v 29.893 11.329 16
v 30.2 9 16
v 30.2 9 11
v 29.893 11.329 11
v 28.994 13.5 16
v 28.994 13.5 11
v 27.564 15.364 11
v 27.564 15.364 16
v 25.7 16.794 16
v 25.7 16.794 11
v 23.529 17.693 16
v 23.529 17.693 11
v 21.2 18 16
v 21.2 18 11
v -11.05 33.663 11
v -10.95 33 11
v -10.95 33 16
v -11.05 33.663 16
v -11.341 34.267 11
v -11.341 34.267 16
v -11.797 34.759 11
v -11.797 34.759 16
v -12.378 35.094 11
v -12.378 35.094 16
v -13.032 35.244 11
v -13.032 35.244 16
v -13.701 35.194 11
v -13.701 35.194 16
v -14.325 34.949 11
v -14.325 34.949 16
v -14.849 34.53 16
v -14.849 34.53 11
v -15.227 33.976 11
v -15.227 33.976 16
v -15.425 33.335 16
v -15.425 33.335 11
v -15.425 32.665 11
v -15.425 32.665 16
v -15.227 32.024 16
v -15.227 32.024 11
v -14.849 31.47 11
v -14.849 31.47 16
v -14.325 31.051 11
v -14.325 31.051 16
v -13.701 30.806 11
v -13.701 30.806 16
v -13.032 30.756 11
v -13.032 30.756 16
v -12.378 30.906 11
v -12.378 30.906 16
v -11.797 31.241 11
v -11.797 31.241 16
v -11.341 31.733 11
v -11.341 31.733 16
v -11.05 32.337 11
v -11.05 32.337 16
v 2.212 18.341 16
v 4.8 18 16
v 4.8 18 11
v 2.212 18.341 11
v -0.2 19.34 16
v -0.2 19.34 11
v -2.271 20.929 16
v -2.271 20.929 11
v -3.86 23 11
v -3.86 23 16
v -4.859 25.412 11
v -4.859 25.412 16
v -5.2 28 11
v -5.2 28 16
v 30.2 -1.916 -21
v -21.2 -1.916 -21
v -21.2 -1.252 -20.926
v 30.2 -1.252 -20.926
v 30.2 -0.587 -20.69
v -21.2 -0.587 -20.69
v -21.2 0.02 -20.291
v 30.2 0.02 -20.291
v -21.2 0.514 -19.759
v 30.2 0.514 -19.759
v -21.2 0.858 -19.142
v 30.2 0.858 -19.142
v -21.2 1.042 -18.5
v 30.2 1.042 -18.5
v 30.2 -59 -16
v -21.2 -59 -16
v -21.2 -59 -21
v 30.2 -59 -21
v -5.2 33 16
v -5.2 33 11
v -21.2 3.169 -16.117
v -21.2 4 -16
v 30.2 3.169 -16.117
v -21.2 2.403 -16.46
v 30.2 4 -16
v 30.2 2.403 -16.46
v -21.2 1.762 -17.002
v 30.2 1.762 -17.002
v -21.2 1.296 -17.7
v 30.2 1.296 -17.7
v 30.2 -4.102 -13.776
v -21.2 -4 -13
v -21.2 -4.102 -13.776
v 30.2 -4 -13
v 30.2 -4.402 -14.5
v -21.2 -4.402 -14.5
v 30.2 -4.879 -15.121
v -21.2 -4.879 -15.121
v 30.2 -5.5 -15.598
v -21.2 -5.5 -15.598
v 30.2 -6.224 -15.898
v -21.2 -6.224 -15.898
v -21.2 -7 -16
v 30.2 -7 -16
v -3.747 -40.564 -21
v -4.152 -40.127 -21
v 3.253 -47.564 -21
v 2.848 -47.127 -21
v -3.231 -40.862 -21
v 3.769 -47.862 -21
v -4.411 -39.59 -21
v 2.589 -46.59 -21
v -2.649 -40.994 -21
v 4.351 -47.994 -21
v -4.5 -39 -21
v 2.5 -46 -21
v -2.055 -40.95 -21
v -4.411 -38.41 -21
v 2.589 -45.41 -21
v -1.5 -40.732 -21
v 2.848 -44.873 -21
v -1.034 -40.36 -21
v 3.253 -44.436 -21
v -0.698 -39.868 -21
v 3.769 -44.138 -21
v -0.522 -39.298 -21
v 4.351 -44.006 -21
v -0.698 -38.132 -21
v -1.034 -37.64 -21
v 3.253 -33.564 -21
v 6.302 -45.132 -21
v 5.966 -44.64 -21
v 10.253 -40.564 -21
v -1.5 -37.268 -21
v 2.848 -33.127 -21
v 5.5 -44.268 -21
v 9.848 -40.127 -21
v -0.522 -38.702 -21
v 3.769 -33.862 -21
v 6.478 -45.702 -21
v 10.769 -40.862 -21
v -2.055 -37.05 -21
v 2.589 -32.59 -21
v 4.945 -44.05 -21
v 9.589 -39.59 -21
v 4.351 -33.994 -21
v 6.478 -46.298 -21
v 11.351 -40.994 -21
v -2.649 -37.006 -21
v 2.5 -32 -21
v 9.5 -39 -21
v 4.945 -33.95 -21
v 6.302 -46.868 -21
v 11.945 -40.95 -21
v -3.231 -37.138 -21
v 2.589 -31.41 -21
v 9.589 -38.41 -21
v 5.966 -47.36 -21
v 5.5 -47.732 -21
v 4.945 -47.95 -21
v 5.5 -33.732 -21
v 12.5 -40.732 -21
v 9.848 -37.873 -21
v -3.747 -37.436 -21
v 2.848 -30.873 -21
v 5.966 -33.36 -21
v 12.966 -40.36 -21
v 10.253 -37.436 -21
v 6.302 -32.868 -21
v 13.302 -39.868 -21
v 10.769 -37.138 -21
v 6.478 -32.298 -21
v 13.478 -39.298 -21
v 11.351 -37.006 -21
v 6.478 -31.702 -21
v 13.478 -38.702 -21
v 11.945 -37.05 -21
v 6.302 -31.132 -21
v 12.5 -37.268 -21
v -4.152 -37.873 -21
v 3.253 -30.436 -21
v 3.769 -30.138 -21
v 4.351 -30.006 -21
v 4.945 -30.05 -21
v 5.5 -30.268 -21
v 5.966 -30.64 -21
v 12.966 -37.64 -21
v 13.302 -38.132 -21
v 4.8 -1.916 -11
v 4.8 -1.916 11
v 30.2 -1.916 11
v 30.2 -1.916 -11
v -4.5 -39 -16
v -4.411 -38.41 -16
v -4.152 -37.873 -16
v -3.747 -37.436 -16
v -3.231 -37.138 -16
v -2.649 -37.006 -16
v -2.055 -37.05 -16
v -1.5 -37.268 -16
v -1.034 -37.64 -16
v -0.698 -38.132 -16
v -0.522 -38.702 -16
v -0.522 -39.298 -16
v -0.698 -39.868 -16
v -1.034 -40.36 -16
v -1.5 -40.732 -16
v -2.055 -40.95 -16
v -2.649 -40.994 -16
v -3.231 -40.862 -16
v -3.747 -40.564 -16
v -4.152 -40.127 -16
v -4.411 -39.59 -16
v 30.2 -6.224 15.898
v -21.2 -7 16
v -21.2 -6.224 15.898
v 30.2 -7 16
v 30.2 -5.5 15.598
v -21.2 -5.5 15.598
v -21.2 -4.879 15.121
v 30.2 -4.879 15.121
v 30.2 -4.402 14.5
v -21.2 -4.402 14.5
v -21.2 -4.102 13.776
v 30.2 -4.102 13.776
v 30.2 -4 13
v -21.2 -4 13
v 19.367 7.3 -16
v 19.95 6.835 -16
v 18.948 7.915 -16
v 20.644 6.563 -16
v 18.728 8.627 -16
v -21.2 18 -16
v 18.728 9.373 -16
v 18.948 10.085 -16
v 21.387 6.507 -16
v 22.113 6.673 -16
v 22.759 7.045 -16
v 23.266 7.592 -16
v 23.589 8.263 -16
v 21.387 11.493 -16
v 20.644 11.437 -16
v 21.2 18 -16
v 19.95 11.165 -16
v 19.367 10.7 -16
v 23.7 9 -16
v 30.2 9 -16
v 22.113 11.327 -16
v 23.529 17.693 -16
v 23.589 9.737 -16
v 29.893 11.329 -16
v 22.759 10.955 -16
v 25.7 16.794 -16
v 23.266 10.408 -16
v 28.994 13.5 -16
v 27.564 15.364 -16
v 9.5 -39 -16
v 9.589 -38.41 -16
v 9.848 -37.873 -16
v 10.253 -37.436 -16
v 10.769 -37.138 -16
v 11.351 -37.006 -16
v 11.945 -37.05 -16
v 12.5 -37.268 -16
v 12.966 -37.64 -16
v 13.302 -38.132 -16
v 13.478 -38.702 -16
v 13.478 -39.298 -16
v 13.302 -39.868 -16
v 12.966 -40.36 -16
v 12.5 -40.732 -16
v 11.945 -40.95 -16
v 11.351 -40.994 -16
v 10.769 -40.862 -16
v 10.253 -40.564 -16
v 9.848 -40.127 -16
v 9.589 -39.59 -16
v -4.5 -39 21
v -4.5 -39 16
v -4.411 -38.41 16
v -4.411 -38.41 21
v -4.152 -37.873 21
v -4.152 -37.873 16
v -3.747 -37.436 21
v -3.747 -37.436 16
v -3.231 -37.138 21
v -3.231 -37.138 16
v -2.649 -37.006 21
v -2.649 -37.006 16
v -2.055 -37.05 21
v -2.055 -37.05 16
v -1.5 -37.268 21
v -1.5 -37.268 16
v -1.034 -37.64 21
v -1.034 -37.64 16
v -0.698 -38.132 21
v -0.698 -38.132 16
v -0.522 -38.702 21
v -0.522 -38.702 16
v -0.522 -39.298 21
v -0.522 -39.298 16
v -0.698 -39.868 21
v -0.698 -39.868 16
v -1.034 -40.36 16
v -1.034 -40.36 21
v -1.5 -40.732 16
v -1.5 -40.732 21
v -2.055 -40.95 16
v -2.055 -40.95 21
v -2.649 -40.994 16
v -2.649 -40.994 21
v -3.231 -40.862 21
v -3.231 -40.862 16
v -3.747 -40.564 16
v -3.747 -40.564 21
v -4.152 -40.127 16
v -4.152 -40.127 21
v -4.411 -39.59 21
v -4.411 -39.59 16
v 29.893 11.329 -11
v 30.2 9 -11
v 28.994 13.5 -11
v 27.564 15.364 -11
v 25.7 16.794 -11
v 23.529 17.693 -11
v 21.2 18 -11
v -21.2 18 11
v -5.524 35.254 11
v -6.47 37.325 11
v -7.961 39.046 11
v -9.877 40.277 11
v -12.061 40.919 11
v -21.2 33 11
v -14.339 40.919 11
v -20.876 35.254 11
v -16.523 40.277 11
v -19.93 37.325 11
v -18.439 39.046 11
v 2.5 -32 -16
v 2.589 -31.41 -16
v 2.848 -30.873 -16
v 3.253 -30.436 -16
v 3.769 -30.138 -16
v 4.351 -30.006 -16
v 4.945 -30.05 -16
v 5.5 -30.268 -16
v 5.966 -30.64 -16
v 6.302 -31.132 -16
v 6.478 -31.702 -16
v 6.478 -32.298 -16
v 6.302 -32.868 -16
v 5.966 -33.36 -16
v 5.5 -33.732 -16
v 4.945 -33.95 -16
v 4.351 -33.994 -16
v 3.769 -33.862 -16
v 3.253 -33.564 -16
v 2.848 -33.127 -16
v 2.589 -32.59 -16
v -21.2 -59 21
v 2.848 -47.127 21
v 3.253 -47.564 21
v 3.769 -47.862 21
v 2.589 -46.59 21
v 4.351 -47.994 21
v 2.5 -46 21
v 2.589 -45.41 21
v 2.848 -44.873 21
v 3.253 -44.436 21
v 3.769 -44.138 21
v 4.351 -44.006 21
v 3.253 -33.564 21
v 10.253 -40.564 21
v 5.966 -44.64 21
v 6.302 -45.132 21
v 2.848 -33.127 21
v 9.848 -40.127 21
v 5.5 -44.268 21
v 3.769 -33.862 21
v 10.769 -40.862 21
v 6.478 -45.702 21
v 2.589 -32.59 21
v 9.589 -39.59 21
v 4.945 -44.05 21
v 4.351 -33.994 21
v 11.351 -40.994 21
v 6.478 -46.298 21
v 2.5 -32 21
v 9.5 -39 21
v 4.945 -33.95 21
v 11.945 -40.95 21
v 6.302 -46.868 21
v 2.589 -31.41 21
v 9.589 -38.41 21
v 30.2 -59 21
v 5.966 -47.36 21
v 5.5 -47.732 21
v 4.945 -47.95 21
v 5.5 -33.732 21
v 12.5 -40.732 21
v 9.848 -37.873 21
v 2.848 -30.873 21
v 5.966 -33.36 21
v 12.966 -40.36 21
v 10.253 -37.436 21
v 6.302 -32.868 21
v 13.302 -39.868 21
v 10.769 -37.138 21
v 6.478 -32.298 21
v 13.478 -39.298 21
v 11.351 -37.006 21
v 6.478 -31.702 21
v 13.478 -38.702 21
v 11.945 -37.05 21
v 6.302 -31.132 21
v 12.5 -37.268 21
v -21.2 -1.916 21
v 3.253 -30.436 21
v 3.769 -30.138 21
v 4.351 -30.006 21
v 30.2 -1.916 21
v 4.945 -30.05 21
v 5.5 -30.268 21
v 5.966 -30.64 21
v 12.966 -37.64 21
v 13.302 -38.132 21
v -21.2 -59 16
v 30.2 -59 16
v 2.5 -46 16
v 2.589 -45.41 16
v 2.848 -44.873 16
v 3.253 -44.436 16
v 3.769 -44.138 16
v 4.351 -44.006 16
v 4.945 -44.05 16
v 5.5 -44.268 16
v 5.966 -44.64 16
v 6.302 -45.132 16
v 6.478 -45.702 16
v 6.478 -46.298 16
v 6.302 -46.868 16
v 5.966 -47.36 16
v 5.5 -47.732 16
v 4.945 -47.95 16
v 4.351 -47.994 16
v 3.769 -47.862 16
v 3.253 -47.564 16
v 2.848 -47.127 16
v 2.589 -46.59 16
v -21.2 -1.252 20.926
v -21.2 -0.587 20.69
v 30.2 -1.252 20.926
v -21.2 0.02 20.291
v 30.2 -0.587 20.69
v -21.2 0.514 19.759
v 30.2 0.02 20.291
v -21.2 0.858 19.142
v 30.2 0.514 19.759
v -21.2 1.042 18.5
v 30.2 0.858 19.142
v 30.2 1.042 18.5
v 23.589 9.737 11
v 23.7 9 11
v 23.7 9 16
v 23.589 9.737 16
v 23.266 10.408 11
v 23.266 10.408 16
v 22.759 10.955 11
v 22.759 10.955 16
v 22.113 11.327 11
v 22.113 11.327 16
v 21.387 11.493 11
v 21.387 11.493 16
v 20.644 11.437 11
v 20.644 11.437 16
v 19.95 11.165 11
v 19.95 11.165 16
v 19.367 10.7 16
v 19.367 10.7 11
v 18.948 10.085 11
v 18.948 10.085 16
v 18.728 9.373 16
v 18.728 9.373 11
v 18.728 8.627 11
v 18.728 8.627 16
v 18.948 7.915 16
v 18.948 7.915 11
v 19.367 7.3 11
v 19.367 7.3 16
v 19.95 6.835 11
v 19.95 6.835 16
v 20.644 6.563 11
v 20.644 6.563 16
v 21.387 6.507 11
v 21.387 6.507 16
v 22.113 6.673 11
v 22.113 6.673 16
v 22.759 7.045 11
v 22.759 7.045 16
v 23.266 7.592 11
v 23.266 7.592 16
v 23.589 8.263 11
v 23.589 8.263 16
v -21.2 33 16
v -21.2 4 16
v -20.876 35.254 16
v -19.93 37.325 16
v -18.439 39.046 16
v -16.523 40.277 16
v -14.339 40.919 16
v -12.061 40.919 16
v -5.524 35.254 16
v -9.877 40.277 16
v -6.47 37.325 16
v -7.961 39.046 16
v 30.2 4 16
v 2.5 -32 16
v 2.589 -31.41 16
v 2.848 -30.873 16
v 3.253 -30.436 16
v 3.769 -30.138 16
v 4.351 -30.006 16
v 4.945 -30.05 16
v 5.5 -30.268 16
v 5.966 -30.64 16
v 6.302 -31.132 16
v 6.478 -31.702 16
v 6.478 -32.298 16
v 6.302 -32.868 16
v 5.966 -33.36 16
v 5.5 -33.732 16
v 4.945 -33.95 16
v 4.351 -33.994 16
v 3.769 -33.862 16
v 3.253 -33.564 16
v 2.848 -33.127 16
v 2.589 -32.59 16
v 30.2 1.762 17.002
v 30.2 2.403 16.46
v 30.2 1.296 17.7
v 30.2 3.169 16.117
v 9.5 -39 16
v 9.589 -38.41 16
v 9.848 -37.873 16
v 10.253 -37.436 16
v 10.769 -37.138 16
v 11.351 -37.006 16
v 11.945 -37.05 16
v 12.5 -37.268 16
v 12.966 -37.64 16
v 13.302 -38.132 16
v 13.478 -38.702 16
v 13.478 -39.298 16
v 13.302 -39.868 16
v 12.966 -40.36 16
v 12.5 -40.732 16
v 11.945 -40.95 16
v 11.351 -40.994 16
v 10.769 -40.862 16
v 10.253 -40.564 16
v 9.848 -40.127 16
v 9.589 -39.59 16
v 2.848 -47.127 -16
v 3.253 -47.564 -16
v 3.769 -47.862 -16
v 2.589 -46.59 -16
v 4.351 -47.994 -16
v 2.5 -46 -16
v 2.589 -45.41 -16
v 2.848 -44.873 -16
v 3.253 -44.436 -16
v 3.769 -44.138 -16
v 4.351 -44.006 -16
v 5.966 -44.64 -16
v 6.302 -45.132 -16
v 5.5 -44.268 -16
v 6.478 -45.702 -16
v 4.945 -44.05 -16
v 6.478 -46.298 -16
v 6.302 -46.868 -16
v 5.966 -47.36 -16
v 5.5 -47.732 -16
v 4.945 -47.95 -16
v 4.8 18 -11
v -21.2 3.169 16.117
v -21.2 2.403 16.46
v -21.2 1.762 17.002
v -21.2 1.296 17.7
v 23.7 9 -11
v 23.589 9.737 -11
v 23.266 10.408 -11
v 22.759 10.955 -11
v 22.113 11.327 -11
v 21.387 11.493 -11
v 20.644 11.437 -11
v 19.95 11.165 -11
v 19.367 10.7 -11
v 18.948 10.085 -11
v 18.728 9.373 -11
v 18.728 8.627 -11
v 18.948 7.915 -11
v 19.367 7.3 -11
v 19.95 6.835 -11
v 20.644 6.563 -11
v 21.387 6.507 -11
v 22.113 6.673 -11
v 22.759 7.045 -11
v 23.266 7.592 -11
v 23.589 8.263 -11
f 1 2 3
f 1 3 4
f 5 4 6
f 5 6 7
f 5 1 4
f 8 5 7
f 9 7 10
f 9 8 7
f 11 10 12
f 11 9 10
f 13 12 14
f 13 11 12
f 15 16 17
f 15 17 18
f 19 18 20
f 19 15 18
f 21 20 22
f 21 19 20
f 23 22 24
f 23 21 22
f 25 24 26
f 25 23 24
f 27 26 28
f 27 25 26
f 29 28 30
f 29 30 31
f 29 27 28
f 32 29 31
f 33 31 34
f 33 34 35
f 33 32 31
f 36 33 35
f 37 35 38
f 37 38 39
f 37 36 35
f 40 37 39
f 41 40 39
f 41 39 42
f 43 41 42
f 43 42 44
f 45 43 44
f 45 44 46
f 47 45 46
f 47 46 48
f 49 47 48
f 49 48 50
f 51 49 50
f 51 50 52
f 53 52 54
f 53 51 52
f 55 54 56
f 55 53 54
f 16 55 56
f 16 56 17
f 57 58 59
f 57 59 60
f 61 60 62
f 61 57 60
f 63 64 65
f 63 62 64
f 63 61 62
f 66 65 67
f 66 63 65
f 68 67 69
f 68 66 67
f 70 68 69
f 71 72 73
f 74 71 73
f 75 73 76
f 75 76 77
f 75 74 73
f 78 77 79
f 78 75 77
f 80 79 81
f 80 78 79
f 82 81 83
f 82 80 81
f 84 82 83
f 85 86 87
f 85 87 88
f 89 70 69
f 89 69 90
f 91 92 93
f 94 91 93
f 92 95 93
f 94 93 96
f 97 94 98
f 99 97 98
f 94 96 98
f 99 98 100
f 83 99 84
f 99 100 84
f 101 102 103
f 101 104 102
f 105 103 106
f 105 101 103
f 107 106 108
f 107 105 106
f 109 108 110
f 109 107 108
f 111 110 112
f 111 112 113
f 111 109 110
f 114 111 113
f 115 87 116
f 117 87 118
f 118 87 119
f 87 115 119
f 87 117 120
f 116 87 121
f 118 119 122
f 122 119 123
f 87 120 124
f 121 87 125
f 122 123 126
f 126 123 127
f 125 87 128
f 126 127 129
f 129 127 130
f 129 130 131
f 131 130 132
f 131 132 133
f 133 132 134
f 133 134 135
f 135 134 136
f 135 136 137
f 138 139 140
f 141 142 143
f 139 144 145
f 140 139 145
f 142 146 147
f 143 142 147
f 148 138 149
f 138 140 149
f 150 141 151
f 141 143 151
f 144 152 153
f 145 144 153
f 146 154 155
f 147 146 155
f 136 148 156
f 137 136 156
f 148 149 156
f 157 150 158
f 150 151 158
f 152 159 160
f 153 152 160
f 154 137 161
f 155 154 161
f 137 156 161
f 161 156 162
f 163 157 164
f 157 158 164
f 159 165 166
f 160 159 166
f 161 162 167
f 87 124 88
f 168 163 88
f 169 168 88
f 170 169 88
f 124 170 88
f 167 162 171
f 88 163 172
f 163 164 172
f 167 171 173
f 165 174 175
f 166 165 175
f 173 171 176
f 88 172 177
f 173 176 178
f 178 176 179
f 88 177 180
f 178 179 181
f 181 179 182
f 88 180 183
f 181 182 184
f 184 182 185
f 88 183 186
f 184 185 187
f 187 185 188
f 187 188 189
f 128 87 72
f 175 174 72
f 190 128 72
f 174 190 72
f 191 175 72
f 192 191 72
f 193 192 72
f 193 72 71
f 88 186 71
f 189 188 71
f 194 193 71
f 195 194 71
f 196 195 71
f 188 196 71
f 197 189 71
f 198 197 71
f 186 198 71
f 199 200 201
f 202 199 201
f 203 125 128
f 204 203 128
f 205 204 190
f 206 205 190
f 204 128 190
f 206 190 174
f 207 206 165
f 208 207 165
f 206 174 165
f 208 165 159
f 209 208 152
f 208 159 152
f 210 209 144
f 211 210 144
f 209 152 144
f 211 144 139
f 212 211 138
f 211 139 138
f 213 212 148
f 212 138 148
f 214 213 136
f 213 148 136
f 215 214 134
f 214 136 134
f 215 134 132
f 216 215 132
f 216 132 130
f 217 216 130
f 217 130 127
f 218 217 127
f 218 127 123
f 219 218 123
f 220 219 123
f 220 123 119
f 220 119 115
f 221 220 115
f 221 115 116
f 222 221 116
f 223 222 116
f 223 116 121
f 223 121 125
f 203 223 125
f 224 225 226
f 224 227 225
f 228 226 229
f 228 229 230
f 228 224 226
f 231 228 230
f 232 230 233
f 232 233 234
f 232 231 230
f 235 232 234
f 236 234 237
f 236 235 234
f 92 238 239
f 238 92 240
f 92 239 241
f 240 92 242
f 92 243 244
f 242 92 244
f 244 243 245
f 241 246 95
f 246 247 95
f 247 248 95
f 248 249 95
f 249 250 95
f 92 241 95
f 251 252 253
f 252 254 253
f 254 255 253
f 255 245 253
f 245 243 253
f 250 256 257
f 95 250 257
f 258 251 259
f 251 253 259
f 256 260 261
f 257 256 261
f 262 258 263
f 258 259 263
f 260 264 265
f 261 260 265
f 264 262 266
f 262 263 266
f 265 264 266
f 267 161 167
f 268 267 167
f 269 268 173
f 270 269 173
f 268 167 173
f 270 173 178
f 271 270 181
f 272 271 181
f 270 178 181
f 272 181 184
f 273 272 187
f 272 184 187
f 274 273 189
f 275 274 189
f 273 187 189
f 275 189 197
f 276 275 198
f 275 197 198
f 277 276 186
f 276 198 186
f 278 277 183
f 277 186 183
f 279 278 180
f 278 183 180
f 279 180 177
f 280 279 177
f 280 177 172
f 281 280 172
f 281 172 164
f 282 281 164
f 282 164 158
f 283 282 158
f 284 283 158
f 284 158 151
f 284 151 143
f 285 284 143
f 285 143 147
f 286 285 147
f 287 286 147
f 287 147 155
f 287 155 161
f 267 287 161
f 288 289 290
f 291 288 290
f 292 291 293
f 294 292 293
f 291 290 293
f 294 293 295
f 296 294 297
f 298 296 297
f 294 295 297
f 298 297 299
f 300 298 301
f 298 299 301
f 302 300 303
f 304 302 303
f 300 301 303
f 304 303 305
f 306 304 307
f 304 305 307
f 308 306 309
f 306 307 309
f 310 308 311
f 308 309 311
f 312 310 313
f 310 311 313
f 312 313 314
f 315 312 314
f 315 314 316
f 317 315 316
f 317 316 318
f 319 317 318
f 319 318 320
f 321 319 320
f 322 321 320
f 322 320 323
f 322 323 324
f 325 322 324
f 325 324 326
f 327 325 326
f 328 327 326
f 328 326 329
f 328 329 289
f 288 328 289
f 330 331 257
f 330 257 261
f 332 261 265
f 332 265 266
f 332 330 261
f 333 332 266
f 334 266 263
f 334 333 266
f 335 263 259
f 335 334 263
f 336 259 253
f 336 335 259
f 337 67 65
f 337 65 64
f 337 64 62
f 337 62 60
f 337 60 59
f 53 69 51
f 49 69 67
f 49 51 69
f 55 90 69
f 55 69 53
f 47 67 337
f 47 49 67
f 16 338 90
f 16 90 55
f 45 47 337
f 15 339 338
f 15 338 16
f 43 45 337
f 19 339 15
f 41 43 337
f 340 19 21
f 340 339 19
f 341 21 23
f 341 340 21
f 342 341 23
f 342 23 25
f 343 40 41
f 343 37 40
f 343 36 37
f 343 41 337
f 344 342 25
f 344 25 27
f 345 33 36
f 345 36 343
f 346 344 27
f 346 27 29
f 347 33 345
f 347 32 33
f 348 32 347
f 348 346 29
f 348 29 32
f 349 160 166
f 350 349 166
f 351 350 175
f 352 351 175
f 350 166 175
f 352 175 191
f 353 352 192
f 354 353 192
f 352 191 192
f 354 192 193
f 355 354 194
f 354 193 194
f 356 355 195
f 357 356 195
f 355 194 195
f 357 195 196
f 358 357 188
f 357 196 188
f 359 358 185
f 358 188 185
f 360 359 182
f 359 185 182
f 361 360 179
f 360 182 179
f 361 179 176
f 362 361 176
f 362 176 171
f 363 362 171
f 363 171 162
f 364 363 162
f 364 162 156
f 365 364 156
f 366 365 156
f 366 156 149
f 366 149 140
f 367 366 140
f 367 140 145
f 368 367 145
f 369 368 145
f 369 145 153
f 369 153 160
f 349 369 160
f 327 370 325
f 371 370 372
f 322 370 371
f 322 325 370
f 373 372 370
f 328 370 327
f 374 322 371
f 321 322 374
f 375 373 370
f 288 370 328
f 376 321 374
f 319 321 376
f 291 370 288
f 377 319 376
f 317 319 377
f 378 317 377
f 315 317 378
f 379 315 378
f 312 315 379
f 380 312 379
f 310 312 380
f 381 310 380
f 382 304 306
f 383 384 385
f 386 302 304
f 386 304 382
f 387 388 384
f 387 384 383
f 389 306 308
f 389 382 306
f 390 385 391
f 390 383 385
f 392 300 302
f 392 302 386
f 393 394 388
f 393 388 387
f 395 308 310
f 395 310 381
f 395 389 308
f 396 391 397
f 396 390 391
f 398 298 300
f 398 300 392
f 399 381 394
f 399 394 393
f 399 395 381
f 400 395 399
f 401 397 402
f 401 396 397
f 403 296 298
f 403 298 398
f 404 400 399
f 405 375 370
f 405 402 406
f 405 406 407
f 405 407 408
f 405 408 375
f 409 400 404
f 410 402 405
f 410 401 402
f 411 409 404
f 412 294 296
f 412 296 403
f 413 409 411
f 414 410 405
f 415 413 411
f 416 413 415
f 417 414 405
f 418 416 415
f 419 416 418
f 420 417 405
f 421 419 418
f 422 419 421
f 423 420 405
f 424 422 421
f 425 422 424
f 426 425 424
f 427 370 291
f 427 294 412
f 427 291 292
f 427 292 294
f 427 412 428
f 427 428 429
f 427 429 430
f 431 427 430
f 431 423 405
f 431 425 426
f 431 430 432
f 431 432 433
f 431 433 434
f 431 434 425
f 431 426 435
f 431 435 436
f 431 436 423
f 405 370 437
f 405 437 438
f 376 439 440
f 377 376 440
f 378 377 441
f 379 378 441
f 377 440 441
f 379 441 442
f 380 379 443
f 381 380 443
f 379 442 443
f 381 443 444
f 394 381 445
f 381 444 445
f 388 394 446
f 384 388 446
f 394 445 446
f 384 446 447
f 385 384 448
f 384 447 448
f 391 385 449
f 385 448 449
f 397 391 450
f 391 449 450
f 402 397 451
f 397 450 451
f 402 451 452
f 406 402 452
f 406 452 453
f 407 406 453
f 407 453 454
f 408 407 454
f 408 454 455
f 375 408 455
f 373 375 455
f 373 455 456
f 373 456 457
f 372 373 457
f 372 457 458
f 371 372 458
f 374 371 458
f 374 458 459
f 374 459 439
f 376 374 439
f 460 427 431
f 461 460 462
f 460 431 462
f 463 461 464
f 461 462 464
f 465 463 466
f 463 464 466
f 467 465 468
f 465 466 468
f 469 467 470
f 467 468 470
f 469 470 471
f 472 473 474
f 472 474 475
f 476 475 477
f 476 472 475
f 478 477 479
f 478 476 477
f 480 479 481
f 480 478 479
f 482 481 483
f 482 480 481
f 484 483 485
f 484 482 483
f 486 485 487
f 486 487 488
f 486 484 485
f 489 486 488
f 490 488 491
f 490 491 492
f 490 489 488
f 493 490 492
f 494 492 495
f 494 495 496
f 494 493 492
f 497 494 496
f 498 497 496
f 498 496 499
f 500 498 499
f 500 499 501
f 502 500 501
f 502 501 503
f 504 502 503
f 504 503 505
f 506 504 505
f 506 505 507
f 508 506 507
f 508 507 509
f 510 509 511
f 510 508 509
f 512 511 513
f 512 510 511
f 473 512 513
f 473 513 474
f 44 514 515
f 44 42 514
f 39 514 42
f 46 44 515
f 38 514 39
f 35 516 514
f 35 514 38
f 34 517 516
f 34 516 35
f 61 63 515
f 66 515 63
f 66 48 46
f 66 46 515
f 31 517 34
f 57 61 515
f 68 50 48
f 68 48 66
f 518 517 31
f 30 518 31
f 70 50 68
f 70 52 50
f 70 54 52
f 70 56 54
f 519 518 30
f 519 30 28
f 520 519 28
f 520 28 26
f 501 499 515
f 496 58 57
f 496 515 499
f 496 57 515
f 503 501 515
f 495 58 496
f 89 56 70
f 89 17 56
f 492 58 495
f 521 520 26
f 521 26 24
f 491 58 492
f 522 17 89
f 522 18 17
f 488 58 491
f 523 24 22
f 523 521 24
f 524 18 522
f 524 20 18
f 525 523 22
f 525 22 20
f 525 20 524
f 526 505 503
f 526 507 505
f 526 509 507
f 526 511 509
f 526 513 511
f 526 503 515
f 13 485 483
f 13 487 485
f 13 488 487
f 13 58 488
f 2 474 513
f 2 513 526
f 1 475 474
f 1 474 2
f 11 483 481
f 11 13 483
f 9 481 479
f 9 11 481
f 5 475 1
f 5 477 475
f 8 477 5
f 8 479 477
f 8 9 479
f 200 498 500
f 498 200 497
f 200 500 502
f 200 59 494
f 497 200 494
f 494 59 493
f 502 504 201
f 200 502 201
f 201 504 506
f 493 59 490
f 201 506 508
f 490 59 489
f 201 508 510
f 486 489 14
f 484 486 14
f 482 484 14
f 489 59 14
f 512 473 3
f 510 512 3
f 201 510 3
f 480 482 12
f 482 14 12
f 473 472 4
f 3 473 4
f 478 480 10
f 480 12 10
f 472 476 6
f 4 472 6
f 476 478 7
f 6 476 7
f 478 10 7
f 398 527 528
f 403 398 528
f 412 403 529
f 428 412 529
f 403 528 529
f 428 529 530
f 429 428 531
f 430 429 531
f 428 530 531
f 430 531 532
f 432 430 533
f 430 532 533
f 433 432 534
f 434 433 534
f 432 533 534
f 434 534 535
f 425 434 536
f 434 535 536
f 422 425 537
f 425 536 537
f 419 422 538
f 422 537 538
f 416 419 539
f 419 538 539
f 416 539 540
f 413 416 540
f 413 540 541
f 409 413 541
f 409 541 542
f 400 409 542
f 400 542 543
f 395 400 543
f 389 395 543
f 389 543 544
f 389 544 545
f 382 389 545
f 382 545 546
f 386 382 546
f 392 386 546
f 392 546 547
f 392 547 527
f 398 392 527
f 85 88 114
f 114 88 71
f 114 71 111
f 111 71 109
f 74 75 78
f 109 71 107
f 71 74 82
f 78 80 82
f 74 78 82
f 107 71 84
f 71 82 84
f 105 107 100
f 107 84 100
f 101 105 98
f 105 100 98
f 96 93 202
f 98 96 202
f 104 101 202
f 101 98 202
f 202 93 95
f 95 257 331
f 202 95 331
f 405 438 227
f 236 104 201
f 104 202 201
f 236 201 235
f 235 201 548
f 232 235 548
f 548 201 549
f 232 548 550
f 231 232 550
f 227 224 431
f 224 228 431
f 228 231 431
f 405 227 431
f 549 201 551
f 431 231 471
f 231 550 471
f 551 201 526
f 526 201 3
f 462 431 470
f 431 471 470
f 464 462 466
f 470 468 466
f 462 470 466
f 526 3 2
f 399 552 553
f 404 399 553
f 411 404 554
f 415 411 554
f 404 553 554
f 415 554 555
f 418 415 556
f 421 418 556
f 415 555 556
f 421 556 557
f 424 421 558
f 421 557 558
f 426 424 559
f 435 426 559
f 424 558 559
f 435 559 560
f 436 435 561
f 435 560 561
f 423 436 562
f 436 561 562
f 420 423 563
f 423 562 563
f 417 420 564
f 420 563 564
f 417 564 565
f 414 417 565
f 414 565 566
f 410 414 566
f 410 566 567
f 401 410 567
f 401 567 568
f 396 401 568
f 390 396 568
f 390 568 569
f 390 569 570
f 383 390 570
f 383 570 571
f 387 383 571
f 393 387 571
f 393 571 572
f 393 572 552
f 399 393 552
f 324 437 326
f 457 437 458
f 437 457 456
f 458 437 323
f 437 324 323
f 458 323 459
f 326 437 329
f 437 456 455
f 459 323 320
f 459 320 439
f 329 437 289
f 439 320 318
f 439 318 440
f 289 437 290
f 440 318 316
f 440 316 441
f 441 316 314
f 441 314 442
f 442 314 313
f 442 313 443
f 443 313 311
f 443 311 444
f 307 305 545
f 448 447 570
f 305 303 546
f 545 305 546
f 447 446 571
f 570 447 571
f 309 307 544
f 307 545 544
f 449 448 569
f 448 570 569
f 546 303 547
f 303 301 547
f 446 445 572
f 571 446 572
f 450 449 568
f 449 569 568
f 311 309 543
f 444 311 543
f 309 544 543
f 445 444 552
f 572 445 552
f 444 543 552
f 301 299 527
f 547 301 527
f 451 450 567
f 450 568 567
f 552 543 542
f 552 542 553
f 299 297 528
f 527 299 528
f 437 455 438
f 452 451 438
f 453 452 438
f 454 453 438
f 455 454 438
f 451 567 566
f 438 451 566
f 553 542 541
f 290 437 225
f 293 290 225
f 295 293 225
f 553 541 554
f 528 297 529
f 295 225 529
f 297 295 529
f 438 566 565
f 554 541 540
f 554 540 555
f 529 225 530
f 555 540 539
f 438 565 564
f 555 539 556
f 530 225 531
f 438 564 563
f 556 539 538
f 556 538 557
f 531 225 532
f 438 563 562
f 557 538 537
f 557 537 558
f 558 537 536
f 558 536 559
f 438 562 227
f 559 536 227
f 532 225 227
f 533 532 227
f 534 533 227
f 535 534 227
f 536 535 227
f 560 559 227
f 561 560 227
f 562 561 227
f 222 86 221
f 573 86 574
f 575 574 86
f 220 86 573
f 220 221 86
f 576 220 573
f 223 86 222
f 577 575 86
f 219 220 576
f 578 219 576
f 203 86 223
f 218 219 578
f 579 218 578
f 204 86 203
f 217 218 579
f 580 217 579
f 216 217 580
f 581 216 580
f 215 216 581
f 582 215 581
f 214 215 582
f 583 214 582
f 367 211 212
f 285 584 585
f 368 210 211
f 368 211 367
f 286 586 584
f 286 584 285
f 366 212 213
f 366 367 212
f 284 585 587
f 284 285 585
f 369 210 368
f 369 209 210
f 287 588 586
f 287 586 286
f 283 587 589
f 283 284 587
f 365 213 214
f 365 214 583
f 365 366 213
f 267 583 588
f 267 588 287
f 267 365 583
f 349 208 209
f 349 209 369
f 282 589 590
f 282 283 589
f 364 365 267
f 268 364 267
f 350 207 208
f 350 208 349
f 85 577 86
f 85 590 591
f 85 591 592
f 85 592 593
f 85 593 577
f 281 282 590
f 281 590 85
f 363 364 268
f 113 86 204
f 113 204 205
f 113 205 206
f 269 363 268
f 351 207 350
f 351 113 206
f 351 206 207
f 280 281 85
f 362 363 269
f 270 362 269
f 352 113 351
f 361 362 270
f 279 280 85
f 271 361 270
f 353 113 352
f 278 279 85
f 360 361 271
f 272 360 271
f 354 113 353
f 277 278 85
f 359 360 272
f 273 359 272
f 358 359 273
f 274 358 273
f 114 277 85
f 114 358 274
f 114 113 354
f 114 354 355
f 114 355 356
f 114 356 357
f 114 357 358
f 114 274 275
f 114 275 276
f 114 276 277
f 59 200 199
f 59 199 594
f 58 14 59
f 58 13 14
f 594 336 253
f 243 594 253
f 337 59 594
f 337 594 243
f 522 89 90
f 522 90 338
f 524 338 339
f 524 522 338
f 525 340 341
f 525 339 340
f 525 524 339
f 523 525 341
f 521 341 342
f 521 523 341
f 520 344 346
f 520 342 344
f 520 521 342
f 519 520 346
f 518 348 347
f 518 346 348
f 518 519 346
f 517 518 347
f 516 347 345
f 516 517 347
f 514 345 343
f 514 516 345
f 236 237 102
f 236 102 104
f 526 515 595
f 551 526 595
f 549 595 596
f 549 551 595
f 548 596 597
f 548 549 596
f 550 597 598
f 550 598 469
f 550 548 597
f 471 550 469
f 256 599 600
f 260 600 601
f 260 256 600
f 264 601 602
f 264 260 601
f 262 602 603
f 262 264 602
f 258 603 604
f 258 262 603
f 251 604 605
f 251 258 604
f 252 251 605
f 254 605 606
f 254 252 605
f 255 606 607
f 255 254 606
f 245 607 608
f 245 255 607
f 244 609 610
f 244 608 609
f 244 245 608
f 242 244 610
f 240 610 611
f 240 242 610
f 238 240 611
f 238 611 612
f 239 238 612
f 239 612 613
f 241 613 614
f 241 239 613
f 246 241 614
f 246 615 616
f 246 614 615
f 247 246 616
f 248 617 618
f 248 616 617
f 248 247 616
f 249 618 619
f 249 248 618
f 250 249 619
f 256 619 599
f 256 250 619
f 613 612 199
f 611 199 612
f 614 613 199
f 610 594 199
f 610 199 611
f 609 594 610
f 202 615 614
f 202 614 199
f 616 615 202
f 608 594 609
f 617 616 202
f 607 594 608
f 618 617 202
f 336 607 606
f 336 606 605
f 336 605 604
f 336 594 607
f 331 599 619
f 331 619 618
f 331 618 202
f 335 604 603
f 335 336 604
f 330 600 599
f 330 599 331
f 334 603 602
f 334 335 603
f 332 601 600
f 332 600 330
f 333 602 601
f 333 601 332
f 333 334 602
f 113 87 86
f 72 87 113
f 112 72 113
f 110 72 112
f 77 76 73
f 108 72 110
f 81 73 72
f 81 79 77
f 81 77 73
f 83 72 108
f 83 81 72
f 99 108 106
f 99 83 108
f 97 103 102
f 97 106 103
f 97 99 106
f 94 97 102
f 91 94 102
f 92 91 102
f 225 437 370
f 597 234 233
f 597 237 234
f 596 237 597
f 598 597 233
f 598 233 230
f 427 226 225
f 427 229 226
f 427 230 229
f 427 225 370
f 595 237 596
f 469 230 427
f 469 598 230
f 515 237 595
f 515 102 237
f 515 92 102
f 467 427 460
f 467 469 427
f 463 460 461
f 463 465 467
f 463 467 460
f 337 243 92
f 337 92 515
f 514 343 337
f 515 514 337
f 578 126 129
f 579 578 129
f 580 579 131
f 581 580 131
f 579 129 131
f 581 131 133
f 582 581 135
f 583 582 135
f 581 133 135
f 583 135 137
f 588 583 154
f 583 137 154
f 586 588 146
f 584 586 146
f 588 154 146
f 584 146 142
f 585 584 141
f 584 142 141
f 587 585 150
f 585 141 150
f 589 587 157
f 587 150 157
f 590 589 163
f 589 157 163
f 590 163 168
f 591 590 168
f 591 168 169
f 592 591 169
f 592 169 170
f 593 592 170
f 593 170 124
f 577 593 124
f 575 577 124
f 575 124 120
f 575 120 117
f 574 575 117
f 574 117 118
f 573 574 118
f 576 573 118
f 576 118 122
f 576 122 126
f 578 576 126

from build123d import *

# Parameters (mm, degrees)
SKETCH1_R              = 2.5
SKETCH1_R_2            = 2.25
BOSS_EXTRUDE1_DEPTH    = 16
CUT_EXTRUDE_START      = -27
CUT_EXTRUDE_4_DEPTH    = 27
EXTRUDE_1_DEPTH        = 55
EXTRUDE_1_DEPTH_BACK   = 5
SKETCH_8_W             = 51.4
SKETCH_8_H             = 5
EXTRUDE_1_2_DEPTH      = 55
EXTRUDE_1_2_DEPTH_BACK = 5
FILLET_1_R             = 3
FILLET_2_R             = 3
FILLET_3_R             = 3
FILLET_4_R             = 3
SKETCH_9_W             = 25.4
SKETCH_9_H             = 19.916079783
CUT_EXTRUDE_5_DEPTH    = 11
SKETCH_10_R            = 2
CUT_EXTRUDE_6_DEPTH    = 79.466808437


with BuildPart() as part:
    # Sketch1 → Boss-Extrude1 (new, symmetric)
    with BuildSketch(Plane.XY):
        with BuildLine():
            Line((-21.2, 33), (-21.2, 22))
            Line((-21.2, 22), (-21.2, 0))
            Line((-21.2, 0), (-21.2, -4))
            Line((-21.2, -4), (30.2, -4))
            Line((30.2, -4), (30.2, 9))
            ThreePointArc((30.2, 9), (27.563961031, 15.363961031), (21.2, 18))
            Line((21.2, 18), (4.8, 18))
            ThreePointArc((4.8, 18), (-2.271067812, 20.928932188), (-5.2, 28))
            Line((-5.2, 28), (-5.2, 33))
            ThreePointArc((-5.2, 33), (-13.2, 41), (-21.2, 33))
        make_face()
        with Locations((21.2, 9)):
            Circle(SKETCH1_R, mode=Mode.SUBTRACT)
        with Locations((-13.2, 33)):
            Circle(SKETCH1_R_2, mode=Mode.SUBTRACT)
    extrude(amount=BOSS_EXTRUDE1_DEPTH, both=True)

    # 草图7 → 切除-拉伸4 (cut)
    with BuildSketch(Plane(origin=(0, 0, -16), x_dir=(-1, 0, 0), z_dir=(0, 0, -1)).offset(CUT_EXTRUDE_START)):
        with BuildLine():
            Line((-4.8, 18), (21.2, 18))
            Line((21.2, 18), (21.2, 33))
            ThreePointArc((21.2, 33), (13.2, 41), (5.2, 33))
            Line((5.2, 33), (5.2, 28))
            ThreePointArc((5.2, 28), (2.271067812, 20.928932188), (-4.8, 18))
        make_face()
    extrude(amount=CUT_EXTRUDE_4_DEPTH, mode=Mode.SUBTRACT)


with BuildPart() as body_2:
    # 草图8 → 凸台-拉伸1 (new, two sides: drawn at the far end of the back side and taken through both)
    with BuildSketch(Plane.XZ.offset(4).offset(-EXTRUDE_1_DEPTH_BACK)):
        with Locations((4.5, 18.5)):
            Rectangle(SKETCH_8_W, SKETCH_8_H)
    extrude(amount=EXTRUDE_1_DEPTH + EXTRUDE_1_DEPTH_BACK)


with BuildPart() as body_3:
    # 草图8 → Extrude 1 2 (new, two sides: drawn at the far end of the back side and taken through both)
    with BuildSketch(Plane.XZ.offset(4).offset(-EXTRUDE_1_2_DEPTH_BACK)):
        with Locations((4.5, -18.5)):
            Rectangle(SKETCH_8_W, SKETCH_8_H)
    extrude(amount=EXTRUDE_1_2_DEPTH + EXTRUDE_1_2_DEPTH_BACK)

    # Combine 1: union part, body 2
    add(part.part)
    add(body_2.part)

    # 圆角1
    fillet_1_edges = [body_3.edges().sort_by_distance(p)[0] for p in [
        (4.5, 1, -16),
    ]]
    fillet(fillet_1_edges, radius=FILLET_1_R)

    # 圆角2
    fillet_2_edges = [body_3.edges().sort_by_distance(p)[0] for p in [
        (4.5, 1, 16),
    ]]
    fillet(fillet_2_edges, radius=FILLET_2_R)

    # 圆角3
    fillet_3_edges = [body_3.edges().sort_by_distance(p)[0] for p in [
        (4.5, -4, -16),
        (4.5, -4, 16),
    ]]
    fillet(fillet_3_edges, radius=FILLET_3_R)

    # 圆角4
    fillet_4_edges = [body_3.edges().sort_by_distance(p)[0] for p in [
        (4.5, 1, 21),
        (4.5, 1, -21),
    ]]
    fillet(fillet_4_edges, radius=FILLET_4_R)

    # 草图9 → 切除-拉伸5 (cut, symmetric)
    with BuildSketch(Plane.XY):
        with Locations((17.5, 8.041960108)):
            Rectangle(SKETCH_9_W, SKETCH_9_H)
    extrude(amount=CUT_EXTRUDE_5_DEPTH, both=True, mode=Mode.SUBTRACT)

    # 草图10 → 切除-拉伸6 (cut, through all)
    with BuildSketch(Plane(origin=(0, 0, -21), x_dir=(-1, 0, 0), z_dir=(0, 0, -1))):
        with Locations((2.5, -39)):
            Circle(SKETCH_10_R)
        with Locations((-4.5, -32)):
            Circle(SKETCH_10_R)
        with Locations((-4.5, -46)):
            Circle(SKETCH_10_R)
        with Locations((-11.5, -39)):
            Circle(SKETCH_10_R)
    extrude(amount=-CUT_EXTRUDE_6_DEPTH, mode=Mode.SUBTRACT)


solid = body_3.part
